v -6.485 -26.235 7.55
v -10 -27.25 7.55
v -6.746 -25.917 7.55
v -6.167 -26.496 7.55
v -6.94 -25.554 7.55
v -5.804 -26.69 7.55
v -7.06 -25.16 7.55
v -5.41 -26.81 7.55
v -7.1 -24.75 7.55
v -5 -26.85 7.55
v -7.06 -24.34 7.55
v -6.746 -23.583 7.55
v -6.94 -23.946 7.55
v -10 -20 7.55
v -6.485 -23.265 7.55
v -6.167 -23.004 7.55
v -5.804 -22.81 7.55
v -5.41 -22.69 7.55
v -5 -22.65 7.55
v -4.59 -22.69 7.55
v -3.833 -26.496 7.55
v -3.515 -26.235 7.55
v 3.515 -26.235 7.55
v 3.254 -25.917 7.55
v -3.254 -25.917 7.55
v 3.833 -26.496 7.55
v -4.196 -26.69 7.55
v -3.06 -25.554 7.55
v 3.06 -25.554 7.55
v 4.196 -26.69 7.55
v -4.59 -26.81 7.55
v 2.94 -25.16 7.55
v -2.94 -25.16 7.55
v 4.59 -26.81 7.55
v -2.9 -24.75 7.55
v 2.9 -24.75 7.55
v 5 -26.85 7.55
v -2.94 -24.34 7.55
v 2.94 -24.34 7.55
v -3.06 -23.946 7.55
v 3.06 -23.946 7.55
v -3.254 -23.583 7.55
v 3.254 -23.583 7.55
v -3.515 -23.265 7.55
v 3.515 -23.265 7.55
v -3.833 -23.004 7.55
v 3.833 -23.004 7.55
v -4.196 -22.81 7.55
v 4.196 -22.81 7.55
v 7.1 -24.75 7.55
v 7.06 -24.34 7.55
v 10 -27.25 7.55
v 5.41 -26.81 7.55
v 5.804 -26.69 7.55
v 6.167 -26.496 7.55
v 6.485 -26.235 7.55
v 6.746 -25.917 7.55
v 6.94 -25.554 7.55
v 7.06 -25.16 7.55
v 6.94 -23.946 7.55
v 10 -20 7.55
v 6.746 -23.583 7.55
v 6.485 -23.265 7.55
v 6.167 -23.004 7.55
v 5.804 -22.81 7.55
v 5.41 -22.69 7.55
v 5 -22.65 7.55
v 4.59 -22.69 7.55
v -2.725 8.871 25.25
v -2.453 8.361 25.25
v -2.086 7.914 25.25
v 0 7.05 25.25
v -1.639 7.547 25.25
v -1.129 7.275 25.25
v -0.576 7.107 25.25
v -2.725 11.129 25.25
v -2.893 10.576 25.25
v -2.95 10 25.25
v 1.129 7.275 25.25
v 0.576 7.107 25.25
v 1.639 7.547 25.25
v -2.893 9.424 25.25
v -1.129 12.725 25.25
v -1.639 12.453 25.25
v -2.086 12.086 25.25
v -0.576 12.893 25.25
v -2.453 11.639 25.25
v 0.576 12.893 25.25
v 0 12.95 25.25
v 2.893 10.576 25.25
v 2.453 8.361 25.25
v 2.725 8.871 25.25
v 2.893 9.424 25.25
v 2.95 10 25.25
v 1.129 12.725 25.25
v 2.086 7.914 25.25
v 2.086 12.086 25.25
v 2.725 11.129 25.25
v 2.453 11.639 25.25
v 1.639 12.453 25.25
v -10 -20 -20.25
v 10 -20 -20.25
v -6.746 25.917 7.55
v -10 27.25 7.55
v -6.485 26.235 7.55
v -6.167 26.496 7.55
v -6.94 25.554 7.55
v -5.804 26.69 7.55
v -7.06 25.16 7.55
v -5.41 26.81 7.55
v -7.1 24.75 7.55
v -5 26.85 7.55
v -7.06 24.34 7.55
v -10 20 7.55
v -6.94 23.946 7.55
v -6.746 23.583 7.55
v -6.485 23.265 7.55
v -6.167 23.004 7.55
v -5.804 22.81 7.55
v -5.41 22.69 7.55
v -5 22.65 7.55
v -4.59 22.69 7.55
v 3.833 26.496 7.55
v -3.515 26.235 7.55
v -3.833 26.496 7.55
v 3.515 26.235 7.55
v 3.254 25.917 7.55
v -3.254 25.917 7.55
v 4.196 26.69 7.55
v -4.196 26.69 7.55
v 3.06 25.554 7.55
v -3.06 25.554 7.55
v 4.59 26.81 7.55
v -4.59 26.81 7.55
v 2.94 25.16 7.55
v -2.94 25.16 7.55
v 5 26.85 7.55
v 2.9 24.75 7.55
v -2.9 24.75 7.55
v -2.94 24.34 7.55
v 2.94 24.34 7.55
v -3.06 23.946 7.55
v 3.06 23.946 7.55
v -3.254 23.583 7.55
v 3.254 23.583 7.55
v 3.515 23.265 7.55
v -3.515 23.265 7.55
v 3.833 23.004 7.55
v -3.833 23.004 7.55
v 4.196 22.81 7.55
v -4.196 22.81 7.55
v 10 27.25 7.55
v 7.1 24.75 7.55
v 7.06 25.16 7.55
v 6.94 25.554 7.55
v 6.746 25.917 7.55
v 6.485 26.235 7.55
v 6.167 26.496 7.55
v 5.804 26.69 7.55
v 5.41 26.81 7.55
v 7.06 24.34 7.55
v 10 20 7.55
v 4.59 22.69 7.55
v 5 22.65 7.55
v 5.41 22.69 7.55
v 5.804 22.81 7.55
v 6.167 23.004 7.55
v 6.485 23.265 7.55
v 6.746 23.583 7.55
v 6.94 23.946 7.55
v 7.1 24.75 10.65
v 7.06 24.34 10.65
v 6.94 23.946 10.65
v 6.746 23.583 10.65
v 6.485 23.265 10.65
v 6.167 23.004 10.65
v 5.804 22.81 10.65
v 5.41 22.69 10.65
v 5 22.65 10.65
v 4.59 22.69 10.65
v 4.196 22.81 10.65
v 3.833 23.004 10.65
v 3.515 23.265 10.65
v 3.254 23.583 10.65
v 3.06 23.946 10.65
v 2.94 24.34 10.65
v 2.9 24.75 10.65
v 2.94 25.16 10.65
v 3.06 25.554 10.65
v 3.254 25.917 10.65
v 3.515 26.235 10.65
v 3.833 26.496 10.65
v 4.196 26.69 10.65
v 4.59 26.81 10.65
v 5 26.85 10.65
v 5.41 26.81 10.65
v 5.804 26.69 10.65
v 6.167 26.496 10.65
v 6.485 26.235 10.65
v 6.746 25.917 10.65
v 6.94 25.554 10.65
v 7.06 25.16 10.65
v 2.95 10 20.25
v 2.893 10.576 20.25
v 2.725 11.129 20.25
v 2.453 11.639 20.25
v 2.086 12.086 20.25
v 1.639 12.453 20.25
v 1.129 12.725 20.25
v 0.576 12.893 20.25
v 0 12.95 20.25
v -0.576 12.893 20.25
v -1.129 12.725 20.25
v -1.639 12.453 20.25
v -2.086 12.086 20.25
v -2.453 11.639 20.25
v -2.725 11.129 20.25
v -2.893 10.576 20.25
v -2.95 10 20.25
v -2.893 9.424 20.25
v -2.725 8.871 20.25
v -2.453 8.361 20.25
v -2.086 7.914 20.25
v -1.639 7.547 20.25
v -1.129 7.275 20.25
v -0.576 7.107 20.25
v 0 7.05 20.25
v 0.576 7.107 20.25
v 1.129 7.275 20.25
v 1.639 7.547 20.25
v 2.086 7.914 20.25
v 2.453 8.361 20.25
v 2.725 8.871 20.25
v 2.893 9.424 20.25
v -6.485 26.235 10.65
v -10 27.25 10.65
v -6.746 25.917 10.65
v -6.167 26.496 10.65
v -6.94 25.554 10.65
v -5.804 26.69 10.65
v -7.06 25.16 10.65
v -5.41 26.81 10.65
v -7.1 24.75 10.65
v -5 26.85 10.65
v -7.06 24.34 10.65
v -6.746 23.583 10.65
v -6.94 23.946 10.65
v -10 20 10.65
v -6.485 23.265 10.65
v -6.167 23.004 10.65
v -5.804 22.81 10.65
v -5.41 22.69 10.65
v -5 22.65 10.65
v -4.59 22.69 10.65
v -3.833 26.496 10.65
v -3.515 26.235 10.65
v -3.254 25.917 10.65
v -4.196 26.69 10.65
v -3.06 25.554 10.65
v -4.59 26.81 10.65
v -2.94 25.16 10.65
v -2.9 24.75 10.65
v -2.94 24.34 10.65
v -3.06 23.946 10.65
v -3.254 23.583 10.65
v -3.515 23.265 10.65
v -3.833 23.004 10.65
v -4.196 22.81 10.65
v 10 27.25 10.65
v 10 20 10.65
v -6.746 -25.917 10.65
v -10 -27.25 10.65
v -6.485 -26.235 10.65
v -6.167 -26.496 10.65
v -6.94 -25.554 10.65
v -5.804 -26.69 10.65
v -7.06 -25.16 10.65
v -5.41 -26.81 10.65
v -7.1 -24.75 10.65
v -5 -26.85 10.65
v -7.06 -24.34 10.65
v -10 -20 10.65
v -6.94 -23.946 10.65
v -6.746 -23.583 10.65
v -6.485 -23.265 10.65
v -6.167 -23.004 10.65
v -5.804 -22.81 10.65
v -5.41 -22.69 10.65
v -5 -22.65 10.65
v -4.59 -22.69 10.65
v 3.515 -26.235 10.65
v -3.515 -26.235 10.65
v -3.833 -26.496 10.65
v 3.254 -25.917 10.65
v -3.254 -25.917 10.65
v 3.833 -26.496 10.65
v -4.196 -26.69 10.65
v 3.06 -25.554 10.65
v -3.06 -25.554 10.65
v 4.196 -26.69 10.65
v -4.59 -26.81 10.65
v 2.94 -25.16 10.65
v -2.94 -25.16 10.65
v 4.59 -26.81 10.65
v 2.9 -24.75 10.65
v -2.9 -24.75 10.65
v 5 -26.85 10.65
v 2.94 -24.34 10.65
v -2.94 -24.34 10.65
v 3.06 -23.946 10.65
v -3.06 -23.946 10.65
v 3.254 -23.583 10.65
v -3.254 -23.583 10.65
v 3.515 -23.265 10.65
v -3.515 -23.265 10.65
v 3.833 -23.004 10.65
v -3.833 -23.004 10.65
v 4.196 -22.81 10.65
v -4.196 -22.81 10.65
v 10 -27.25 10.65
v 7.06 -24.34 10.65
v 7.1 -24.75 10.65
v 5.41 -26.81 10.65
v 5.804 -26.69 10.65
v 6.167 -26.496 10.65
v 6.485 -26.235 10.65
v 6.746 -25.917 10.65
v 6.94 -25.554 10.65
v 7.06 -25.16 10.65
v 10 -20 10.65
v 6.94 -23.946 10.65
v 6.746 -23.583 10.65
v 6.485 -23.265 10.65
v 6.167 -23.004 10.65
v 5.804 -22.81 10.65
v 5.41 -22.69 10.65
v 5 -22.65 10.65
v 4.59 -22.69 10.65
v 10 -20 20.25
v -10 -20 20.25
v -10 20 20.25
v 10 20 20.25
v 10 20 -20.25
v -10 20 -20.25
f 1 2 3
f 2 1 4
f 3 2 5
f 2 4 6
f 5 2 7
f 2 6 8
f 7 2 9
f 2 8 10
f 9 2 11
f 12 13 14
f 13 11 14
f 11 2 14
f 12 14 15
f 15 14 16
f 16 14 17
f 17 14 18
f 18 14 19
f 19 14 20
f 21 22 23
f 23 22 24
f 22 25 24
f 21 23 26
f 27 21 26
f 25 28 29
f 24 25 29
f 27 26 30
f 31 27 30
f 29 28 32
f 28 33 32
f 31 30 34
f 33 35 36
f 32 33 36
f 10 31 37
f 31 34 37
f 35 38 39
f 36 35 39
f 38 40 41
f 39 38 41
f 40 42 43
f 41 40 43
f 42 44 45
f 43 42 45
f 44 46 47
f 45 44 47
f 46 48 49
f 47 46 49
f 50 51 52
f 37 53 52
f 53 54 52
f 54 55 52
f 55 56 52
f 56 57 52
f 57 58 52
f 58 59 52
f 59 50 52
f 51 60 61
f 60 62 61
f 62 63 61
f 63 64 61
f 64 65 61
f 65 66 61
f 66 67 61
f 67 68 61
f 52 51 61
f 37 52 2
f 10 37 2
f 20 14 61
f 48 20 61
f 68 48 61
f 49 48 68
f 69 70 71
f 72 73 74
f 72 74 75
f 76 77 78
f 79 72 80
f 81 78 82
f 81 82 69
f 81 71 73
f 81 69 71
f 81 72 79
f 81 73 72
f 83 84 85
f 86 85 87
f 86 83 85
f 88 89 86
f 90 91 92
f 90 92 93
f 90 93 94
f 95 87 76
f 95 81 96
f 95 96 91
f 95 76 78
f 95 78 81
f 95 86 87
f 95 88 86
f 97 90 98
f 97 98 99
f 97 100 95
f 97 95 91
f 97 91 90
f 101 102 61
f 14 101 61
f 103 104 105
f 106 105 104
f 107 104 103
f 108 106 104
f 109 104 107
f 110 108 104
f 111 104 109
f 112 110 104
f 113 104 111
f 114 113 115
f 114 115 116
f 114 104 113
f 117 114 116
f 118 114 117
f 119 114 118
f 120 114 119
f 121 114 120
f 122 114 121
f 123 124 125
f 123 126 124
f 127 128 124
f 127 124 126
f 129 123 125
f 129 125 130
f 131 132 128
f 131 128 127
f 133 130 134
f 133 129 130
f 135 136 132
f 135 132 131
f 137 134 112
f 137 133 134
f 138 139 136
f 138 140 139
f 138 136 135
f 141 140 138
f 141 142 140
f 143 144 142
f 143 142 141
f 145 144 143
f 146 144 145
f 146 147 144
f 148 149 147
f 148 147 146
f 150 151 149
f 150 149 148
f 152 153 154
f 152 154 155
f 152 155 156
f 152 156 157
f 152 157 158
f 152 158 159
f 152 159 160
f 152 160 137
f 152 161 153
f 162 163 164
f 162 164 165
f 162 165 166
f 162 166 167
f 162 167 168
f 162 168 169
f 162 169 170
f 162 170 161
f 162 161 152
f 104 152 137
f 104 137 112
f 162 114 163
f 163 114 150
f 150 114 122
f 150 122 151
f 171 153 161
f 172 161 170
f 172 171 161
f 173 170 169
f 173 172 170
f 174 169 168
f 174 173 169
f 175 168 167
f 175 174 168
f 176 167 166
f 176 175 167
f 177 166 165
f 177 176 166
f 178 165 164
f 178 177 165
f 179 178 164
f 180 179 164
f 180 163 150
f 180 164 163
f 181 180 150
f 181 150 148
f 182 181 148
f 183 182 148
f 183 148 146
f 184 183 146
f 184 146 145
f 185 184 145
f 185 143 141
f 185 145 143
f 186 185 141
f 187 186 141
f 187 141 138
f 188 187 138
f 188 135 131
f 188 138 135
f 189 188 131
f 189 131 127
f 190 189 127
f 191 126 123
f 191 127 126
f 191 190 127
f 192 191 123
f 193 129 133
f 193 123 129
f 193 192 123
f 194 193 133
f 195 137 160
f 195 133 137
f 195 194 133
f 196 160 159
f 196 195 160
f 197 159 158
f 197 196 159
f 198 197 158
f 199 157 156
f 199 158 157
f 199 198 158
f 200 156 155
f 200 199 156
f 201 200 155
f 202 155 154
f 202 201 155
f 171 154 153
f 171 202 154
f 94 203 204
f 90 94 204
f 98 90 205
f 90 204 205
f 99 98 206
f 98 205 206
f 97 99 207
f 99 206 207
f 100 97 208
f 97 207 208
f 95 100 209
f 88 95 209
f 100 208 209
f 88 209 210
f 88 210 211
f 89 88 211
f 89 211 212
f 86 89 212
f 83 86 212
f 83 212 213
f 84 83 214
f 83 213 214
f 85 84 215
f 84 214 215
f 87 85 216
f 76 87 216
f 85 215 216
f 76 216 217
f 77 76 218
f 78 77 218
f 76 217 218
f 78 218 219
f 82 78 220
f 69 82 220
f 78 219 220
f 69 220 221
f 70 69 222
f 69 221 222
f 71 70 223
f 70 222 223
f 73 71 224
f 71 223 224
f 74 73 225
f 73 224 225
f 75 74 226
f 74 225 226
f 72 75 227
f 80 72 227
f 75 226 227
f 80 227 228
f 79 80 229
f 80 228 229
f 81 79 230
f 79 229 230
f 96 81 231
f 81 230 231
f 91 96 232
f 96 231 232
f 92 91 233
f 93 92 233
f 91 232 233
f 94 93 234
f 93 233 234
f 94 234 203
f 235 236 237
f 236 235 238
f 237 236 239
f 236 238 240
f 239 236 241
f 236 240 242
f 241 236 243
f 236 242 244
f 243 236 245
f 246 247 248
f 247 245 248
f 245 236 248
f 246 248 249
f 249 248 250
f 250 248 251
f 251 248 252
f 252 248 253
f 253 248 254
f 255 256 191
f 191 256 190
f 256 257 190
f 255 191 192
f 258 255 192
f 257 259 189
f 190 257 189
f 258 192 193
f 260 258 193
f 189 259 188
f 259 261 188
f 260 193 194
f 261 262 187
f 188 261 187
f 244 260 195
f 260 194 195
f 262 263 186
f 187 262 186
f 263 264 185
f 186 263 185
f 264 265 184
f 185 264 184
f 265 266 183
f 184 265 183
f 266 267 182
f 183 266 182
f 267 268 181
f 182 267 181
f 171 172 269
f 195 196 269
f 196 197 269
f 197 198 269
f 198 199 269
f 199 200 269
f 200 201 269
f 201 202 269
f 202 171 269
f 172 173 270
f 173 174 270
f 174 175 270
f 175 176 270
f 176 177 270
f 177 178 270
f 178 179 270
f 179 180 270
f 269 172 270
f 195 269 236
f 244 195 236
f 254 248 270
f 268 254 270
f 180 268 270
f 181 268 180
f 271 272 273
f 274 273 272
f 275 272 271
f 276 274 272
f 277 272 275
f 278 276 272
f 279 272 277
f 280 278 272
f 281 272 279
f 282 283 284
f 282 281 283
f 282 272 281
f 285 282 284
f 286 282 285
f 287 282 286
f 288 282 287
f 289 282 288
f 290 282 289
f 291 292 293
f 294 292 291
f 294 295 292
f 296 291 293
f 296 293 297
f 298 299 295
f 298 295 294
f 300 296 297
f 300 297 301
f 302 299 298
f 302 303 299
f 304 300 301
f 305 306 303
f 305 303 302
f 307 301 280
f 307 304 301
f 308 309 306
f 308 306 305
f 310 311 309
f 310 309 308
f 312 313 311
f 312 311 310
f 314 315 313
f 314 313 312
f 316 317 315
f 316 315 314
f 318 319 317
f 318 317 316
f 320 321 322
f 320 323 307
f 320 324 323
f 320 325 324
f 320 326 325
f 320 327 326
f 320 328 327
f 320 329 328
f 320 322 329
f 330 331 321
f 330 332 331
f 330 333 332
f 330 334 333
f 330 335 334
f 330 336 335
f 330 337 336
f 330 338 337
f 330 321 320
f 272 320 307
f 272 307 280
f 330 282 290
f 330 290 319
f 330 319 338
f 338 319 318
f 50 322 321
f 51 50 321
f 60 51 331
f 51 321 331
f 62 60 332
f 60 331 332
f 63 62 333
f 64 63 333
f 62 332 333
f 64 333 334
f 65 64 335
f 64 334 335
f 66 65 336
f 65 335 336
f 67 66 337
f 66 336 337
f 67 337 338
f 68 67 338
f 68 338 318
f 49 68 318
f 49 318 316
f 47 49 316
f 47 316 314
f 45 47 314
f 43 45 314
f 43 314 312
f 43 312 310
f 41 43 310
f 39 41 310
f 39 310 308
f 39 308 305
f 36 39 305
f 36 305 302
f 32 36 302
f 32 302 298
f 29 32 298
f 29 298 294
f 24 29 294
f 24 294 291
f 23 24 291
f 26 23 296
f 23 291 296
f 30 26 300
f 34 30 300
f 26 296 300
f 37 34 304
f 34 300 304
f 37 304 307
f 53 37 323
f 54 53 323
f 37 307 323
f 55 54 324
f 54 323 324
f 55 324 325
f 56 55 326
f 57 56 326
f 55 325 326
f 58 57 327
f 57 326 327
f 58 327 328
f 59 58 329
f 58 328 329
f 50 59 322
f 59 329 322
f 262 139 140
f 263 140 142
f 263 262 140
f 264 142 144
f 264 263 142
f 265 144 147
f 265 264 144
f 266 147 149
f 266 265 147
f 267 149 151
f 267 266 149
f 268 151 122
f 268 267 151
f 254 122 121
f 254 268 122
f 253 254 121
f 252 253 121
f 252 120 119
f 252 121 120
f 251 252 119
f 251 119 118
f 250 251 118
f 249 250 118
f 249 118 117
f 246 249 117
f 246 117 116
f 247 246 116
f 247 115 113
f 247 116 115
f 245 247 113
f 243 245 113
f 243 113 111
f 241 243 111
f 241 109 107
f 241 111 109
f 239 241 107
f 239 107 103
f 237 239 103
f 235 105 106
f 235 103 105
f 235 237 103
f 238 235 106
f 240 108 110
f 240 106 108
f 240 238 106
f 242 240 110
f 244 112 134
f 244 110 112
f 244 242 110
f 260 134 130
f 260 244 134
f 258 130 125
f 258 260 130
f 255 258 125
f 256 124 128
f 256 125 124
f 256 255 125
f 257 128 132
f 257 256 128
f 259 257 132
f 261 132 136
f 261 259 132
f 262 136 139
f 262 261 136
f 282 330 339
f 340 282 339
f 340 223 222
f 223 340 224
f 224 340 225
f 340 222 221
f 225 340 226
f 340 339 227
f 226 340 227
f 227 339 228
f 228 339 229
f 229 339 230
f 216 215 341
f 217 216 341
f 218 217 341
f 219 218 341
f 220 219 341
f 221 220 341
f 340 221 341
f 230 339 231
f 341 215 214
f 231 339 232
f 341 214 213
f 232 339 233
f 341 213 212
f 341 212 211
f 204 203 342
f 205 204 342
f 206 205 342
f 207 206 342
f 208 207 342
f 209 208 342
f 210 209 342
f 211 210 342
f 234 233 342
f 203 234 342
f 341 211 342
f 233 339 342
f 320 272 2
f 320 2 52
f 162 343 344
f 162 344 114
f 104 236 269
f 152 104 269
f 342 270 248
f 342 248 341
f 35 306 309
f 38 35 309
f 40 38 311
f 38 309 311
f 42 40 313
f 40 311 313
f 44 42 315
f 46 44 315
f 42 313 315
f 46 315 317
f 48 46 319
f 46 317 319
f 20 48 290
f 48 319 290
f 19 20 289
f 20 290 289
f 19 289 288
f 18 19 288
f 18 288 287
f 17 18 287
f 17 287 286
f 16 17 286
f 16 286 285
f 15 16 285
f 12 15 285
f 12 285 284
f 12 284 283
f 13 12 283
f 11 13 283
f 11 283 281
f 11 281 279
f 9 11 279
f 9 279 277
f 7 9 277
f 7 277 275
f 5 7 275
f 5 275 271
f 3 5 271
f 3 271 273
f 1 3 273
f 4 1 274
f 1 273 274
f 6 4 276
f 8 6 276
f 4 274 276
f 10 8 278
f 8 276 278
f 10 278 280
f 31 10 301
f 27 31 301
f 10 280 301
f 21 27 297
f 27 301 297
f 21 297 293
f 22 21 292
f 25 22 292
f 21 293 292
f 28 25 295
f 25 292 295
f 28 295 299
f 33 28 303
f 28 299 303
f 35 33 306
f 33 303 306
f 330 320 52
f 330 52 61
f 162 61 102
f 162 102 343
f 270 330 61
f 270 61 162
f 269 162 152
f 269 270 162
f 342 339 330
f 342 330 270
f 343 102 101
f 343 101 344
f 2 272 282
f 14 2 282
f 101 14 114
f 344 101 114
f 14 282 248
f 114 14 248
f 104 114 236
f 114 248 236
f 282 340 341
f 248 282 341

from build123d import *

# Parameters (mm, degrees)
SKETCH1_W           = 40
SKETCH1_H           = 40.5
BOSS_EXTRUDE1_DEPTH = 10
SKETCH2_W           = 20
SKETCH2_H           = 3.1
BOSS_EXTRUDE2_DEPTH = 7.25
SKETCH3_R           = 2.1
CUT_EXTRUDE1_DEPTH  = 43.395430178
SKETCH5_R           = 2.95
BOSS_EXTRUDE3_DEPTH = 5


with BuildPart() as part:
    # Sketch1 → Boss-Extrude1 (new, symmetric)
    with BuildSketch(Plane.YZ):
        Rectangle(SKETCH1_W, SKETCH1_H)
    extrude(amount=BOSS_EXTRUDE1_DEPTH, both=True)

    # Sketch2 → Boss-Extrude2 (add)
    with BuildSketch(Plane.XZ.offset(20)):
        with Locations((0, 9.1)):
            Rectangle(SKETCH2_W, SKETCH2_H)
    boss_extrude2 = extrude(amount=BOSS_EXTRUDE2_DEPTH)

    # Sketch3 → Cut-Extrude1 (cut, through all)
    with BuildSketch(Plane.XY.offset(10.65)):
        with Locations((-5, -24.75)):
            Circle(SKETCH3_R)
        with Locations((5, -24.75)):
            Circle(SKETCH3_R)
    cut_extrude1 = extrude(amount=-CUT_EXTRUDE1_DEPTH, mode=Mode.SUBTRACT)

    # Mirror1: Boss-Extrude2, Cut-Extrude1 across plane
    add(boss_extrude2.mirror(Plane.ZX))
    add(cut_extrude1.mirror(Plane.ZX), mode=Mode.SUBTRACT)

    # Sketch5 → Boss-Extrude3 (add)
    with BuildSketch(Plane.XY.offset(20.25)):
        with Locations((0, 10)):
            Circle(SKETCH5_R)
    extrude(amount=BOSS_EXTRUDE3_DEPTH)


solid = part.part
